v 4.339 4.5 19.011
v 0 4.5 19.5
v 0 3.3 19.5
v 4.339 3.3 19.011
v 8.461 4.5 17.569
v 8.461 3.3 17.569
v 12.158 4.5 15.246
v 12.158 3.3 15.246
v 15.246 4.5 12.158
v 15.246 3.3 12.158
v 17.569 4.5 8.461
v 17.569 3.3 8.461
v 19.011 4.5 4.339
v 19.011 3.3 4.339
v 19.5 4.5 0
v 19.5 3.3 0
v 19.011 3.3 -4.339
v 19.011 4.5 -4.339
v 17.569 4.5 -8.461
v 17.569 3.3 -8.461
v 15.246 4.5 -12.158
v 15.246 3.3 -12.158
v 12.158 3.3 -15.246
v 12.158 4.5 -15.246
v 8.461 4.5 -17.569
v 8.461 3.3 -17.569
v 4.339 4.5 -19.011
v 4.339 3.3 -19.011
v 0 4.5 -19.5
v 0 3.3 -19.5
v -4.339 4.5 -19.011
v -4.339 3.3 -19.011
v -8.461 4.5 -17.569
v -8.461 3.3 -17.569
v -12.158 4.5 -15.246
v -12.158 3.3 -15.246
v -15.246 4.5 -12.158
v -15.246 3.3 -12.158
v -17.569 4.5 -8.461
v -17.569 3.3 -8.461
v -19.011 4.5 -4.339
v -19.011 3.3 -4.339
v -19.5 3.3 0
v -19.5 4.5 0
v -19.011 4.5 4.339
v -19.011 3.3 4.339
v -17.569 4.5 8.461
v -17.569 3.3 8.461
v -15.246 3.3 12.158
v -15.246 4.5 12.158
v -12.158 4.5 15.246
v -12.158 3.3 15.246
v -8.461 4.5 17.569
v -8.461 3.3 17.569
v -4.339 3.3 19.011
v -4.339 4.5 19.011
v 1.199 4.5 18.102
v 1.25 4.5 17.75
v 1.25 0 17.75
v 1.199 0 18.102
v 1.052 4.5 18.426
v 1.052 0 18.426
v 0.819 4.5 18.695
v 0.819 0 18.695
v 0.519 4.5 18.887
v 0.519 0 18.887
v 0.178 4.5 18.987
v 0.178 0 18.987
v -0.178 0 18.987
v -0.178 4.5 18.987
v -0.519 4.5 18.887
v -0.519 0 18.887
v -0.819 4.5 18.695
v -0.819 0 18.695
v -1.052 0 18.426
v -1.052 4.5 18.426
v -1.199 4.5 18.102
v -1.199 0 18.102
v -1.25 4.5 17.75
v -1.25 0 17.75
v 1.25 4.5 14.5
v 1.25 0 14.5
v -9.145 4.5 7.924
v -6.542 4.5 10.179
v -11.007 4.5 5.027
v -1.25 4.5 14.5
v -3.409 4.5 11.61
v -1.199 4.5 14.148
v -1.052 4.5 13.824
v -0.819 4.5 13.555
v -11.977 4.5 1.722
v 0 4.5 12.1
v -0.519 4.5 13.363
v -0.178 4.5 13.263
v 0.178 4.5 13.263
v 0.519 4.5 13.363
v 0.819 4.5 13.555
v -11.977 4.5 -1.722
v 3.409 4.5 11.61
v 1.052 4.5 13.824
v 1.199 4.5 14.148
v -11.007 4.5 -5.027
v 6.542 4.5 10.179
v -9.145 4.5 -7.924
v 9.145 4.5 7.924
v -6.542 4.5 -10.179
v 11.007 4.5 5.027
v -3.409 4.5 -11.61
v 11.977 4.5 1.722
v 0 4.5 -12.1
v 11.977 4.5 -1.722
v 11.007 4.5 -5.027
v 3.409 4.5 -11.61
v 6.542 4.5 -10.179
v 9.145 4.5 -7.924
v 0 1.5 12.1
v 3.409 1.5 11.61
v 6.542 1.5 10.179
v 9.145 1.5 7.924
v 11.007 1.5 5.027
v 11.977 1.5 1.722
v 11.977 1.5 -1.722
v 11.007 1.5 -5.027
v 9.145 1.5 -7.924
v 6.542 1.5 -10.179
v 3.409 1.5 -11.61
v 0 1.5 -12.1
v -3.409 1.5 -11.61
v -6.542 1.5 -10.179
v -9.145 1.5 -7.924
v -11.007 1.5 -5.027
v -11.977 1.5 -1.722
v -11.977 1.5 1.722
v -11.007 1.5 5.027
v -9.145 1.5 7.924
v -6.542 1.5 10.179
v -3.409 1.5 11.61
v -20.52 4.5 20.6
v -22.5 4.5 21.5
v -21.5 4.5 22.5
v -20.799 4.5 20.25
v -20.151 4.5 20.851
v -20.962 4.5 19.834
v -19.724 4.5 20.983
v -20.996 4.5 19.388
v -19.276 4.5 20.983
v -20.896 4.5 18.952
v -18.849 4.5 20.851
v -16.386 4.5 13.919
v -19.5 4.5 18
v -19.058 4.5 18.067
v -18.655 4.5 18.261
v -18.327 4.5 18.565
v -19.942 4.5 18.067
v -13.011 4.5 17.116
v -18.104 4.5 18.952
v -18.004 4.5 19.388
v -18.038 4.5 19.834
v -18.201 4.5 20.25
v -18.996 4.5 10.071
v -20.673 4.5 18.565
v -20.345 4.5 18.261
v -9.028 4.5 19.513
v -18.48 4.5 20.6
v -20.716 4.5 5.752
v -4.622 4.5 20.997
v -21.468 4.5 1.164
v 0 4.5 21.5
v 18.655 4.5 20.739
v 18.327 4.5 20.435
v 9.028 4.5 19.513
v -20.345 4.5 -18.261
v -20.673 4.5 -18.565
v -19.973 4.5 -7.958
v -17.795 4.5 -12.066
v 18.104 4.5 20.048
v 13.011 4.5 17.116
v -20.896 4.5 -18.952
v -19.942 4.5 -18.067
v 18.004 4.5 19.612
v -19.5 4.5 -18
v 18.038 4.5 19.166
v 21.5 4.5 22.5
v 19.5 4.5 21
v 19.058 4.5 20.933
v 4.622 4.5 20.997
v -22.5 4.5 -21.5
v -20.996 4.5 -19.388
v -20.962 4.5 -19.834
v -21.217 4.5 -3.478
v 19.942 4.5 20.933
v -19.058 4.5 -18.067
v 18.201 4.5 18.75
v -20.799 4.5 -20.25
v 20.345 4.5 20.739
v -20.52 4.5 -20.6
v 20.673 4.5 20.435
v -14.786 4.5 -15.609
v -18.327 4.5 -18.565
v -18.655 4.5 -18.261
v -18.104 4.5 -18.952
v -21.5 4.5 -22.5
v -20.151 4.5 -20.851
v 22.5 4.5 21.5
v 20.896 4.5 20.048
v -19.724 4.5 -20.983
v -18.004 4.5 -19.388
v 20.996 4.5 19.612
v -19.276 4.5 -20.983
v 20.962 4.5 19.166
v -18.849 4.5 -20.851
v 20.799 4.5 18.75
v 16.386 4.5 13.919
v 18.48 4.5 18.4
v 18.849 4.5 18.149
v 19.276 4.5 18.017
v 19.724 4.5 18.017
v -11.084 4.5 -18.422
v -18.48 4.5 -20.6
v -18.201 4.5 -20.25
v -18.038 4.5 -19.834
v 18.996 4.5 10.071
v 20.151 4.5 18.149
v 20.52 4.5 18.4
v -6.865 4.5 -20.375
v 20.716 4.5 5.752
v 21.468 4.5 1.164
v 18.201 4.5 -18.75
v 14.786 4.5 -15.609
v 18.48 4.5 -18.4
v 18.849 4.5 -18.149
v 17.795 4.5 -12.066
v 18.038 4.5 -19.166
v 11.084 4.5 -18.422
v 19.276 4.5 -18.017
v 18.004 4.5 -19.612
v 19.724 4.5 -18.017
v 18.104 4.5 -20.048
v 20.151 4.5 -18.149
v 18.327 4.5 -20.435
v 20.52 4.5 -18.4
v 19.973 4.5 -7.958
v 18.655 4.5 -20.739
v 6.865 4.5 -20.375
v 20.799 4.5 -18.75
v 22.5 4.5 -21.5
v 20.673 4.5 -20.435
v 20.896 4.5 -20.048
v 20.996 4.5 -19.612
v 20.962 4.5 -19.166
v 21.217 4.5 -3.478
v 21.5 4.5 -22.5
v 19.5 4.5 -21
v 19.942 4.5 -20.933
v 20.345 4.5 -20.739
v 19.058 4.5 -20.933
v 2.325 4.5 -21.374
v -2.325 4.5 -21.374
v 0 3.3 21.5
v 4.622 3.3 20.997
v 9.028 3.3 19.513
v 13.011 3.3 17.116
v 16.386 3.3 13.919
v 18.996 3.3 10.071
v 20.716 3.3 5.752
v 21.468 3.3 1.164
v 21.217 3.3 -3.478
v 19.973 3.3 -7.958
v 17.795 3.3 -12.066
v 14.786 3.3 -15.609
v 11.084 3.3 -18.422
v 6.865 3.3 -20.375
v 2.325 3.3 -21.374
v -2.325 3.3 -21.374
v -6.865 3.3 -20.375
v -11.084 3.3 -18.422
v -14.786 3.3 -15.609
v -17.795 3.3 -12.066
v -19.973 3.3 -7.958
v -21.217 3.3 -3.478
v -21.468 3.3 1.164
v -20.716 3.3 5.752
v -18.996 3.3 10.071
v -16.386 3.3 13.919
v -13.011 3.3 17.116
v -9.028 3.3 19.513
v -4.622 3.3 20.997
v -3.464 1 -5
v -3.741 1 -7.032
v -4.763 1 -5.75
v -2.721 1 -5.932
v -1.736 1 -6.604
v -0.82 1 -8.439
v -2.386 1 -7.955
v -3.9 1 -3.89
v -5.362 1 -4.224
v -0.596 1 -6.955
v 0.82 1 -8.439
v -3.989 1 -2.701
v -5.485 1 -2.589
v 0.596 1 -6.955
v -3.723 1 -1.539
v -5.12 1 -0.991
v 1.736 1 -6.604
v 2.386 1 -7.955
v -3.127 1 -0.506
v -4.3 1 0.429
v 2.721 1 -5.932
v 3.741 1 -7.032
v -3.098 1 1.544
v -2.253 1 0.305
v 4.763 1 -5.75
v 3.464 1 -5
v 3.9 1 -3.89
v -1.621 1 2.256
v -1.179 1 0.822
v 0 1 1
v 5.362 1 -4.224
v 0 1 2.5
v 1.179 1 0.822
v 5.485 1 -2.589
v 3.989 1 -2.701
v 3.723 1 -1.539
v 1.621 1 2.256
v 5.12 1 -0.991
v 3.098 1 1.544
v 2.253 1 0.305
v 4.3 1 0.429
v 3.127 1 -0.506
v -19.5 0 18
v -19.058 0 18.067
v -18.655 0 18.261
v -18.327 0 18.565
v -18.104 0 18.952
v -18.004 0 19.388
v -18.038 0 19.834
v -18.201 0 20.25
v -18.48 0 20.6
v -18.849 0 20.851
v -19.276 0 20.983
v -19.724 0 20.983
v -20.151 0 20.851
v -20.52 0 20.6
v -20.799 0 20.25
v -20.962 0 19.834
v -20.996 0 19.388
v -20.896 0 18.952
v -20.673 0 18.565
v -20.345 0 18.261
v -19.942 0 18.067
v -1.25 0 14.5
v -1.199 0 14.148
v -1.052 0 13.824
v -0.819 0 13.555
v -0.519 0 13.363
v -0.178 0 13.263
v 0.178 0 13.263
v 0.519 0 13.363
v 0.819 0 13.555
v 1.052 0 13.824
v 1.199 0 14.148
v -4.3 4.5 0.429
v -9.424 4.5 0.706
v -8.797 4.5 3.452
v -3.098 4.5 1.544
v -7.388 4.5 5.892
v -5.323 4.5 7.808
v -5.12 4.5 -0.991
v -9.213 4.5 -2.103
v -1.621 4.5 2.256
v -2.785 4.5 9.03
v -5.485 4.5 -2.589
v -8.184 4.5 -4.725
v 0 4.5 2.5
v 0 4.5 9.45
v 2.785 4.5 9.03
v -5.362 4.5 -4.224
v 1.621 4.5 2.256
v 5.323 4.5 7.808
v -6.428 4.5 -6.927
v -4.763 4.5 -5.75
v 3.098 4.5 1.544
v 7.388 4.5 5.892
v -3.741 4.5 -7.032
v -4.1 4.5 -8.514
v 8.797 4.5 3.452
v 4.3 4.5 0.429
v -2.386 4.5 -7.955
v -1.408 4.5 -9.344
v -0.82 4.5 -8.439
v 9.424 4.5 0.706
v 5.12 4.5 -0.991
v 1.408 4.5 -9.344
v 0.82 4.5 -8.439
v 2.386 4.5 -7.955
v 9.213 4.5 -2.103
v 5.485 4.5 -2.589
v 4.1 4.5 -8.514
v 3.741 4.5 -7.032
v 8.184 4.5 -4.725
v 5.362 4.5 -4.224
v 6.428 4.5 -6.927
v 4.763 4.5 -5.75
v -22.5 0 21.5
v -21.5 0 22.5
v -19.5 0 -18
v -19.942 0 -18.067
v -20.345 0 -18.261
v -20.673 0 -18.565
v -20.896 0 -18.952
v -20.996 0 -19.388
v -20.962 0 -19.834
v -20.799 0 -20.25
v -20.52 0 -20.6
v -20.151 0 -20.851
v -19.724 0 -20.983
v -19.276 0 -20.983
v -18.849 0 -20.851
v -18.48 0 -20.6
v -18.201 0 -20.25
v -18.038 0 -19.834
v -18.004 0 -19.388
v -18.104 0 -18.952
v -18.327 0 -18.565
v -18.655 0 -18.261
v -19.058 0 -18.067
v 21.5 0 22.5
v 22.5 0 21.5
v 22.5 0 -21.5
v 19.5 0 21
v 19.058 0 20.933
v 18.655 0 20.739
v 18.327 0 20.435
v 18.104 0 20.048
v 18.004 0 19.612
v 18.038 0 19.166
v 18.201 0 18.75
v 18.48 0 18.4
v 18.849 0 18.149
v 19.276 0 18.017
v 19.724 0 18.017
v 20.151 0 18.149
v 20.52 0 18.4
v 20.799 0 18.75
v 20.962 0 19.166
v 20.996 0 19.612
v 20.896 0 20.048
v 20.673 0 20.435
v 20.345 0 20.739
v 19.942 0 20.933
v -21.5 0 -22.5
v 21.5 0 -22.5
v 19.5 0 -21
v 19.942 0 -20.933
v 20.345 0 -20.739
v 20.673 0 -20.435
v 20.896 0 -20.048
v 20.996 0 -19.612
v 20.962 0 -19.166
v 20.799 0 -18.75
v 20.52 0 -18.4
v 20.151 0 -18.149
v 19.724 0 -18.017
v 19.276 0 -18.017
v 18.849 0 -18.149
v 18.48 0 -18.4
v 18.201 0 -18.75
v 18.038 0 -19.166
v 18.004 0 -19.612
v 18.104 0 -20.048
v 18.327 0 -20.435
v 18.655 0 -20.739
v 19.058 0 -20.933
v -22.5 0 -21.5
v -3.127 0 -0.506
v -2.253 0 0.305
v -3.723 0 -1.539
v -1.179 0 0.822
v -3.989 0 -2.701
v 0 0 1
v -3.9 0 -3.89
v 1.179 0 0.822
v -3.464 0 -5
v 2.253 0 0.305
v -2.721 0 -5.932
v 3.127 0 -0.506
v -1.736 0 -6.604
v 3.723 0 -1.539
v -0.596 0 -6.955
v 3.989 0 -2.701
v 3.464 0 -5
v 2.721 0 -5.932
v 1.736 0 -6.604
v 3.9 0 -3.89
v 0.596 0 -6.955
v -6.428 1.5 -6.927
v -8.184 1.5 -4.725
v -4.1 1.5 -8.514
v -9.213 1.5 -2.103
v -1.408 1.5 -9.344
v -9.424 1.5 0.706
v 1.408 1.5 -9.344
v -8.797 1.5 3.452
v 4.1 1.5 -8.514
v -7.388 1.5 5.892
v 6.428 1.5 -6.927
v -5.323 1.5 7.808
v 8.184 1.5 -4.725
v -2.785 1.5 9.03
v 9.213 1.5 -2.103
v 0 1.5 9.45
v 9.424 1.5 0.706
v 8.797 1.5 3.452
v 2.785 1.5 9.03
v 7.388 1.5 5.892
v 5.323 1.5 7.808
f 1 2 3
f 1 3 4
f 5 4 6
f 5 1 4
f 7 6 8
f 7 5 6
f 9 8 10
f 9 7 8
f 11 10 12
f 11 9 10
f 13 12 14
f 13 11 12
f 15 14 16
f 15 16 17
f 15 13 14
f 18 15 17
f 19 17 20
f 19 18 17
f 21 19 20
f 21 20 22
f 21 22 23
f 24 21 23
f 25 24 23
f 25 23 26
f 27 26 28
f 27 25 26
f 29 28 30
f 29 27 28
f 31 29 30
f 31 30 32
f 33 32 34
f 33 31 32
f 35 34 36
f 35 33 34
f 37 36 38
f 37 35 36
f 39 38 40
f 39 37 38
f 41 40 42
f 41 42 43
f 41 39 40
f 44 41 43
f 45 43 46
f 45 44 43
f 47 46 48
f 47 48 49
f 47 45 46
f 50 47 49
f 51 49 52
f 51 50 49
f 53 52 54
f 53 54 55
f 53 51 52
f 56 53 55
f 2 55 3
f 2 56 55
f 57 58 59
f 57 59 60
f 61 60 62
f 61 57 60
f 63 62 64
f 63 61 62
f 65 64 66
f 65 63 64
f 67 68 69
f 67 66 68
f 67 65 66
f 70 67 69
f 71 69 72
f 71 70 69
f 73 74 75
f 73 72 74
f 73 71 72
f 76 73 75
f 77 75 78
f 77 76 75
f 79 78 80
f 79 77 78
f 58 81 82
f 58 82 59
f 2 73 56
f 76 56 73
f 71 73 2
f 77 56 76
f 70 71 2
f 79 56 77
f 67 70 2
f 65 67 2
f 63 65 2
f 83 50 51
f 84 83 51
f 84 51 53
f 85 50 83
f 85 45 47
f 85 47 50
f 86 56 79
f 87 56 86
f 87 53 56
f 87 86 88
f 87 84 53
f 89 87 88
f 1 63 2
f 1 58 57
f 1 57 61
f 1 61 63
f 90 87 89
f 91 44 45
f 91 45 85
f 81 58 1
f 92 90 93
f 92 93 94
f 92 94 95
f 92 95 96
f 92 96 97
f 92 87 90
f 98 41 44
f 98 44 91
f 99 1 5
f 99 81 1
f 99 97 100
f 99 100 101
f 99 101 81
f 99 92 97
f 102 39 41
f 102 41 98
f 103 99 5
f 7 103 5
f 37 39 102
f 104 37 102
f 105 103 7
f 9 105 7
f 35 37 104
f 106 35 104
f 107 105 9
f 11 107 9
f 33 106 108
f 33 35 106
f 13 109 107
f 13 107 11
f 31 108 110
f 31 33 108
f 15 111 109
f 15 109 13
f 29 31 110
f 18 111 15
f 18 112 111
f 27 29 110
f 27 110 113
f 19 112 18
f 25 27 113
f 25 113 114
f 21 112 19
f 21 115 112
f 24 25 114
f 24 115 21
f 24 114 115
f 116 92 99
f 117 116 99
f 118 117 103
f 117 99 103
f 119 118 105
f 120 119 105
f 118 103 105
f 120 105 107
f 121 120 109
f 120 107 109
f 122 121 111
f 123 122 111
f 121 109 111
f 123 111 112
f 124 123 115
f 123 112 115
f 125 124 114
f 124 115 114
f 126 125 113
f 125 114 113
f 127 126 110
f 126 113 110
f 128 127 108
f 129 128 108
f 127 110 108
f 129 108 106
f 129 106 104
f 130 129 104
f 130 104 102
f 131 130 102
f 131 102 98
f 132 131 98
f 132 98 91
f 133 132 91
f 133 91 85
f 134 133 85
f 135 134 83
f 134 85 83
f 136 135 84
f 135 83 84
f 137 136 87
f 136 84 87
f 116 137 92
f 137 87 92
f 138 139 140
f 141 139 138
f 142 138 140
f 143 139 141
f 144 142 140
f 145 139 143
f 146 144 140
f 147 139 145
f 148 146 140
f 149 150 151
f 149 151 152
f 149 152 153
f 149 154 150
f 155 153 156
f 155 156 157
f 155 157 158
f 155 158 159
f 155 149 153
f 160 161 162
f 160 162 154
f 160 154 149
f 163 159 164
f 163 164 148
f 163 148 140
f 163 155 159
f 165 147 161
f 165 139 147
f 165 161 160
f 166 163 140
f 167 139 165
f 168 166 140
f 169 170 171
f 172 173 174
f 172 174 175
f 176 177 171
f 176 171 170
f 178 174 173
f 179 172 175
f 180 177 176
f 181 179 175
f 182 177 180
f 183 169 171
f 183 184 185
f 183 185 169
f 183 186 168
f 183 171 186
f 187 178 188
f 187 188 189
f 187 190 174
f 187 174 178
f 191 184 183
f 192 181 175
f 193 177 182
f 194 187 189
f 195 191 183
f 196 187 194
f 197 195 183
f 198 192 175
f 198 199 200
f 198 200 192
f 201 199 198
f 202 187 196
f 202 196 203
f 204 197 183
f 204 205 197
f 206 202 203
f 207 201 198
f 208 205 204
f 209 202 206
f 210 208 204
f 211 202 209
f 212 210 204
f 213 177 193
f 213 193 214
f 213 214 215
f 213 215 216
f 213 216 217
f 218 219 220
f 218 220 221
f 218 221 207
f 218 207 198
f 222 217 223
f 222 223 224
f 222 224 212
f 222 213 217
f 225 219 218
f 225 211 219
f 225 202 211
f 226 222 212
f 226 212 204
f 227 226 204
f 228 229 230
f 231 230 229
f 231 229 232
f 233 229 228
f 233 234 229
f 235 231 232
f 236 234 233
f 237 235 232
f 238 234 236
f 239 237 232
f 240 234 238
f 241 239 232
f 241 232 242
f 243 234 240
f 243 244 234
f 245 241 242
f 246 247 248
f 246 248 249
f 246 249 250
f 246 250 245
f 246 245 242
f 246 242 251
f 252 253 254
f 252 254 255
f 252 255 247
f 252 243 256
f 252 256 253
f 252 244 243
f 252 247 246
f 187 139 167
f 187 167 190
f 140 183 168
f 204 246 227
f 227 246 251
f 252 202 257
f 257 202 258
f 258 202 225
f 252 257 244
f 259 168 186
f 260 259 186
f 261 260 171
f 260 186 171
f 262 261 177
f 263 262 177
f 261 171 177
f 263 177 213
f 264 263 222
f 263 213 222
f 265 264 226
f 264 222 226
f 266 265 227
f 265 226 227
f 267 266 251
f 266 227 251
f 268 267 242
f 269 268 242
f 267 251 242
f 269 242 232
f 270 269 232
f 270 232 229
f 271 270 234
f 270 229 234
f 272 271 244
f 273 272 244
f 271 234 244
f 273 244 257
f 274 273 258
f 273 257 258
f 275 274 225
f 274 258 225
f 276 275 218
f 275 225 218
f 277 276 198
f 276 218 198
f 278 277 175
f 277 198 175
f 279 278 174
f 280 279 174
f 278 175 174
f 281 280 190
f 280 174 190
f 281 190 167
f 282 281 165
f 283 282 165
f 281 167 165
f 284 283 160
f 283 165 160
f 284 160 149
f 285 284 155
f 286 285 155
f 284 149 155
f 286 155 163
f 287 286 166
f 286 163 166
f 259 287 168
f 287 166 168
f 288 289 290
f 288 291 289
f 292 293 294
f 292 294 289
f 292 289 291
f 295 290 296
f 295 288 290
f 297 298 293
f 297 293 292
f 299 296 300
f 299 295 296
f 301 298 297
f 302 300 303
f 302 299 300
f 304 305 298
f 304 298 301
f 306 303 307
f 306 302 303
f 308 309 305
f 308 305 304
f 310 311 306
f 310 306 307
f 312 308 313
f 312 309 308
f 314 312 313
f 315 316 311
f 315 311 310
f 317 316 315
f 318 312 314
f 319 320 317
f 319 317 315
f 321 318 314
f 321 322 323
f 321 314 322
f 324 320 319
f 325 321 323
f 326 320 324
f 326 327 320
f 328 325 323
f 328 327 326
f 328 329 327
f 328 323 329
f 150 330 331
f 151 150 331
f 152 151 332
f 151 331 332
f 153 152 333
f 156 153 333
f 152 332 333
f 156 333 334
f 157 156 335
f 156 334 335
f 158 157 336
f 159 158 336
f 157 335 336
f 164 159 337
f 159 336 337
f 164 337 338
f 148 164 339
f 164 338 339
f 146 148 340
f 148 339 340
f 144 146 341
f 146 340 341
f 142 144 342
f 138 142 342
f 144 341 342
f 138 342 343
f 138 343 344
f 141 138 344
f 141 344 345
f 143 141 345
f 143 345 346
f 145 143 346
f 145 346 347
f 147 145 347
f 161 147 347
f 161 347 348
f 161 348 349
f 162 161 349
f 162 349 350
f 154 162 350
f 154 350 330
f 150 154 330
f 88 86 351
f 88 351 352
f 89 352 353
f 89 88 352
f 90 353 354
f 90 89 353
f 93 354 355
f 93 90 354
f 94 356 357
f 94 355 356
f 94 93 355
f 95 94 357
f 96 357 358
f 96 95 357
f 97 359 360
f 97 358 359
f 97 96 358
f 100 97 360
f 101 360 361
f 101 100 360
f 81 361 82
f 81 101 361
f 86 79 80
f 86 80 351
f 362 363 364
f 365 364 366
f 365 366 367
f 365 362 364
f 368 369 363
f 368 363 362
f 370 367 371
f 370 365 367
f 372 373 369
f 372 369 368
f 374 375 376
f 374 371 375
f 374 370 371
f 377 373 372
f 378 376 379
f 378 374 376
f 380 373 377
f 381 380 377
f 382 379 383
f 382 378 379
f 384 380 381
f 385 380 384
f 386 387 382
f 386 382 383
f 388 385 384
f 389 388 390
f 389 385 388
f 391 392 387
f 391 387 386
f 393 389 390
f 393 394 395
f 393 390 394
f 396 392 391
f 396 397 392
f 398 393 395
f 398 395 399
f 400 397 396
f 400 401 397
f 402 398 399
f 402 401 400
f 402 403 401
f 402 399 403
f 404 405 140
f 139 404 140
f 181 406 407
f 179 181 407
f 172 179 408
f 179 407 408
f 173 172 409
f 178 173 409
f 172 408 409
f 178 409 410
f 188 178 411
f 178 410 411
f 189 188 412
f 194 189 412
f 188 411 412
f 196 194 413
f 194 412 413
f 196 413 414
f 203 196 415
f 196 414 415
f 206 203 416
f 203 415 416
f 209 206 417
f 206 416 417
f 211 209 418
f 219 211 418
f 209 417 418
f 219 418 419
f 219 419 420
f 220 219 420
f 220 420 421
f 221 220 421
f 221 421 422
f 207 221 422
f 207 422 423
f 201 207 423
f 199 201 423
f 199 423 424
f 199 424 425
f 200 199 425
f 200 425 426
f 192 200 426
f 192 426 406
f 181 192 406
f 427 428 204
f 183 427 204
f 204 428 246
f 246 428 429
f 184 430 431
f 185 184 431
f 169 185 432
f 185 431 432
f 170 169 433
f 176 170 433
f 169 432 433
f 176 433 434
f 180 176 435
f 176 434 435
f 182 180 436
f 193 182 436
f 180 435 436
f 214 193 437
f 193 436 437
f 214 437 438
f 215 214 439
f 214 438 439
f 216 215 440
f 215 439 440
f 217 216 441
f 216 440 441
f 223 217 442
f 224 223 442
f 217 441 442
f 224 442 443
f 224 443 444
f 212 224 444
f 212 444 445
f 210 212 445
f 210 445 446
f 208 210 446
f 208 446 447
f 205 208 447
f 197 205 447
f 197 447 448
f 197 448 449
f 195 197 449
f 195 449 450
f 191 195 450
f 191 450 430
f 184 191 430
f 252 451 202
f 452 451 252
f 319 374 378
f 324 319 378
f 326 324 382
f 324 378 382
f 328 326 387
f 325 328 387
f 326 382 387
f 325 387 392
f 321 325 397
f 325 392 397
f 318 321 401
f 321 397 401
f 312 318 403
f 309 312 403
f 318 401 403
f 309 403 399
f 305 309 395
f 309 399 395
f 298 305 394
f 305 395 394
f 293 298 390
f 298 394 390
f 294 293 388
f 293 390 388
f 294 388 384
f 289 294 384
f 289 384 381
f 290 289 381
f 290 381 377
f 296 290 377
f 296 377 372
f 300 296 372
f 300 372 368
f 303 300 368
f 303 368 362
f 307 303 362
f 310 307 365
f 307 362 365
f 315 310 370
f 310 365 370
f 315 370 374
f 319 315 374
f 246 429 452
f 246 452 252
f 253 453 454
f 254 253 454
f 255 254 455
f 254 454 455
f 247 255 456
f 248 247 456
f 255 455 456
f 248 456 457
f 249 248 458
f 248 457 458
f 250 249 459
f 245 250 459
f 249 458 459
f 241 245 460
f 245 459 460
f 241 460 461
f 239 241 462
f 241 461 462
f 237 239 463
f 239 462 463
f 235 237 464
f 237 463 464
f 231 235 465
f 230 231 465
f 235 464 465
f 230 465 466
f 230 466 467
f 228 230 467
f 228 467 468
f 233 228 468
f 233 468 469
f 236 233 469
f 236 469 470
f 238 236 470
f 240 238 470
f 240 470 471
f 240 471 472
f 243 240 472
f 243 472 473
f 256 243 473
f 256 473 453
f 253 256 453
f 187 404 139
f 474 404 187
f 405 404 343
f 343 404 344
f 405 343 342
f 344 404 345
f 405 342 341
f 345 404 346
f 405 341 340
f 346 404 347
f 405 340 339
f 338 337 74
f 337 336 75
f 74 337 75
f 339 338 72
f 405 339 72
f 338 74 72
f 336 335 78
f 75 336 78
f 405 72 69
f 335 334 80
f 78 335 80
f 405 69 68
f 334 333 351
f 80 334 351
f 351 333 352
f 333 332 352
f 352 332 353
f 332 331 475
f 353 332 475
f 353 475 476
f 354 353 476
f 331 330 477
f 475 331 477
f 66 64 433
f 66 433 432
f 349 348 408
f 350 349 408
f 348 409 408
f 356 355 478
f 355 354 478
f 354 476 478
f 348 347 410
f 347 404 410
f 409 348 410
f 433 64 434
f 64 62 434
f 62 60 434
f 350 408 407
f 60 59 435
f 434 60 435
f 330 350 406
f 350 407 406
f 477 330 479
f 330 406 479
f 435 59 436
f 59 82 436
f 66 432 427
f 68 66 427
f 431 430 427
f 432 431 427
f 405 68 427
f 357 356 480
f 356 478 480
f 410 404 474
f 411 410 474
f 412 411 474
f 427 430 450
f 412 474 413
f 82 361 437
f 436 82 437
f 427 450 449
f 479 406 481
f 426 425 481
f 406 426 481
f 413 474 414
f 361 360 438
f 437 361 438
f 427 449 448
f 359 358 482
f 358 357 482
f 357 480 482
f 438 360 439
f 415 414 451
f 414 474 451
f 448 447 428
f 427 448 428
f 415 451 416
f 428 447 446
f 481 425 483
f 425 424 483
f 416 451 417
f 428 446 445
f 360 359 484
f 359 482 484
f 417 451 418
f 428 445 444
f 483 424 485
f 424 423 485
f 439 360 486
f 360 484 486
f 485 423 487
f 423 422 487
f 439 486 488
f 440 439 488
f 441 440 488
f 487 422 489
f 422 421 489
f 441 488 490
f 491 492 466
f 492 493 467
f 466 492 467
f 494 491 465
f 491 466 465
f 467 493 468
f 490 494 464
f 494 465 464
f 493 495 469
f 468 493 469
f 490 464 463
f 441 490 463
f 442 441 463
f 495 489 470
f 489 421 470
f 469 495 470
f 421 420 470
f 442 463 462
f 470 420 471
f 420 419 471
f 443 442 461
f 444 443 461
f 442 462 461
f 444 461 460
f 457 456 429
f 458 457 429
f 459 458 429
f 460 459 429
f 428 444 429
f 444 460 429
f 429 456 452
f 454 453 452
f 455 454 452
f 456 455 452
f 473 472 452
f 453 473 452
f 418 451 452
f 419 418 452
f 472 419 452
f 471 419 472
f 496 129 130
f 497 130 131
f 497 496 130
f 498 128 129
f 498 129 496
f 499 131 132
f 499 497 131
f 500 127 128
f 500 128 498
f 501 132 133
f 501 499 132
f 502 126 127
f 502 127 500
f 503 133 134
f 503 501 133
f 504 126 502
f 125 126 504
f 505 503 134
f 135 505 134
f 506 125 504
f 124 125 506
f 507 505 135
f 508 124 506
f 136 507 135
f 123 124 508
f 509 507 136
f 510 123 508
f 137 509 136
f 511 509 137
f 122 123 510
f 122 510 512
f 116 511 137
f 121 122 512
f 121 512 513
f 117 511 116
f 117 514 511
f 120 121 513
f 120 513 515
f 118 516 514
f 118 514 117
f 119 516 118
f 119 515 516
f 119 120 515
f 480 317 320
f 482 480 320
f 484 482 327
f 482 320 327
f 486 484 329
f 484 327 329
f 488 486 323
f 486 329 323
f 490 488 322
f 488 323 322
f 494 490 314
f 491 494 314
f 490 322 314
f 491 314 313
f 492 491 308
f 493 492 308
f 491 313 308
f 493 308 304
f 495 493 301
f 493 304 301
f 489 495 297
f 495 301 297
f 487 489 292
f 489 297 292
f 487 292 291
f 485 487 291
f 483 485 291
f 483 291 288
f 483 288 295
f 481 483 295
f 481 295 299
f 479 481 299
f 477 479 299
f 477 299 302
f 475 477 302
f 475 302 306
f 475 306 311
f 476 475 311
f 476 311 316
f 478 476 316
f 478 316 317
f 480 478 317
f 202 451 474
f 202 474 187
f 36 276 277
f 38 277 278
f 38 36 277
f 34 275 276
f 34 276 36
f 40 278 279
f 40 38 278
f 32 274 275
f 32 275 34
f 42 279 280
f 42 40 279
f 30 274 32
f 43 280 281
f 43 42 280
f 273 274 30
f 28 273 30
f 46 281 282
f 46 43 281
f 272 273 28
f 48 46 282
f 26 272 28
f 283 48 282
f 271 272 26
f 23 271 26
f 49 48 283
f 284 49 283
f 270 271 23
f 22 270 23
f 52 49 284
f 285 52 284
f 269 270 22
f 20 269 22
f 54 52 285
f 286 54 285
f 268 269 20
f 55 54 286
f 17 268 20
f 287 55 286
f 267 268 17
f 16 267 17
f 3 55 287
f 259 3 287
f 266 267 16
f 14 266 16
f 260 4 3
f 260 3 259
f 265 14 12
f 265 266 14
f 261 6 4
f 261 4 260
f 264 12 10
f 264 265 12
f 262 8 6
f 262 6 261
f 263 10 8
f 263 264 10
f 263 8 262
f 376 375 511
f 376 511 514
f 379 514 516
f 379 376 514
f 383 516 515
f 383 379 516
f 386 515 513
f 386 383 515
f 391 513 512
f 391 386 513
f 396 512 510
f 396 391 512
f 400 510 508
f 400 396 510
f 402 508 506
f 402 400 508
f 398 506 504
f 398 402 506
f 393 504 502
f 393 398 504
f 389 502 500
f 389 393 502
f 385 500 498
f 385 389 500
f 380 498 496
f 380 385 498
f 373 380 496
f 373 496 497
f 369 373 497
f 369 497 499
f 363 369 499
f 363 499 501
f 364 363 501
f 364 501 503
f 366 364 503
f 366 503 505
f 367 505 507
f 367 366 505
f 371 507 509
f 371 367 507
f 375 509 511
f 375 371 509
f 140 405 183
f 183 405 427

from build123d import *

# Parameters (mm, degrees)
SKETCH_1_W          = 45
SKETCH_1_H          = 45
EXTRUDE_1_DEPTH     = 4.5
SKETCH_2_R          = 5.5
CUT_EXTRUDE_1_DEPTH = 3.5
SKETCH_3_R          = 4
CUT_EXTRUDE_2_DEPTH = 33.011716605
SKETCH_4_R          = 12.1
SKETCH_4_R_2        = 9.45
CUT_EXTRUDE_3_DEPTH = 3
SKETCH_5_R          = 21.5
SKETCH_5_R_2        = 19.5
CUT_EXTRUDE_4_DEPTH = 1.2
CUT_EXTRUDE_5_DEPTH = 33.136427928
SKETCH_8_R          = 1.5
CUT_EXTRUDE_6_DEPTH = 33.136427928
CHAMFER_1_SIZE      = 1


with BuildPart() as part:
    # 草图1 → 凸台-拉伸1 (new body)
    with BuildSketch(Plane(origin=(0, 0, 0), x_dir=(1, 0, 0), z_dir=(0, 1, 0))):
        Rectangle(SKETCH_1_W, SKETCH_1_H)
    extrude(amount=EXTRUDE_1_DEPTH)

    # 草图2 → 切除-拉伸1 (cut)
    with BuildSketch(Plane(origin=(0, 4.5, 0), x_dir=(1, 0, 0), z_dir=(0, 1, 0))):
        with Locations(Location((0, 3, 0), (0, 0, 270))):
            Circle(SKETCH_2_R)
    extrude(amount=-CUT_EXTRUDE_1_DEPTH, mode=Mode.SUBTRACT)

    # 草图3 → 切除-拉伸2 (cut, through all)
    with BuildSketch(Plane(origin=(0, 1, 0), x_dir=(1, 0, 0), z_dir=(0, 1, 0))):
        with Locations(Location((0, 3, 0), (0, 0, 270))):
            Circle(SKETCH_3_R)
    extrude(amount=-CUT_EXTRUDE_2_DEPTH, mode=Mode.SUBTRACT)

    # 草图4 → 切除-拉伸3 (cut)
    with BuildSketch(Plane(origin=(0, 4.5, 0), x_dir=(1, 0, 0), z_dir=(0, 1, 0))):
        with Locations(Location((0, 0, 0), (0, 0, 270))):
            Circle(SKETCH_4_R)
        with Locations(Location((0, 0, 0), (0, 0, 270))):
            Circle(SKETCH_4_R_2, mode=Mode.SUBTRACT)
    extrude(amount=-CUT_EXTRUDE_3_DEPTH, mode=Mode.SUBTRACT)

    # 草图5 → 切除-拉伸4 (cut)
    with BuildSketch(Plane(origin=(0, 4.5, 0), x_dir=(1, 0, 0), z_dir=(0, 1, 0))):
        with Locations(Location((0, 0, 0), (0, 0, 270))):
            Circle(SKETCH_5_R)
        with Locations(Location((0, 0, 0), (0, 0, 270))):
            Circle(SKETCH_5_R_2, mode=Mode.SUBTRACT)
    extrude(amount=-CUT_EXTRUDE_4_DEPTH, mode=Mode.SUBTRACT)

    # 草图6 → 切除-拉伸5 (cut, through all)
    with BuildSketch(Plane(origin=(0, 4.5, 0), x_dir=(1, 0, 0), z_dir=(0, 1, 0))):
        with BuildLine():
            Line((1.25, -14.5), (1.25, -17.75))
            ThreePointArc((1.25, -17.75), (0, -19), (-1.25, -17.75))
            Line((-1.25, -17.75), (-1.25, -14.5))
            ThreePointArc((-1.25, -14.5), (0, -13.25), (1.25, -14.5))
        make_face()
    extrude(amount=-CUT_EXTRUDE_5_DEPTH, mode=Mode.SUBTRACT)

    # 草图8 → 切除-拉伸6 (cut, through all)
    with BuildSketch(Plane.XZ):
        with Locations(Location((-19.5, 19.5, 0), (0, 0, 270))):
            Circle(SKETCH_8_R)
        with Locations(Location((19.5, 19.5, 0), (0, 0, 90))):
            Circle(SKETCH_8_R)
        with Locations(Location((19.5, -19.5, 0), (0, 0, 270))):
            Circle(SKETCH_8_R)
        with Locations(Location((-19.5, -19.5, 0), (0, 0, 90))):
            Circle(SKETCH_8_R)
    extrude(amount=-CUT_EXTRUDE_6_DEPTH, mode=Mode.SUBTRACT)

    # 倒角1
    chamfer_1_edges = [part.edges().sort_by_distance(p)[0] for p in [
        (22.5, 2.25, 22.5),
        (-22.5, 2.25, 22.5),
        (-22.5, 2.25, -22.5),
        (22.5, 2.25, -22.5),
    ]]
    chamfer(chamfer_1_edges, length=CHAMFER_1_SIZE)


solid = part.part
